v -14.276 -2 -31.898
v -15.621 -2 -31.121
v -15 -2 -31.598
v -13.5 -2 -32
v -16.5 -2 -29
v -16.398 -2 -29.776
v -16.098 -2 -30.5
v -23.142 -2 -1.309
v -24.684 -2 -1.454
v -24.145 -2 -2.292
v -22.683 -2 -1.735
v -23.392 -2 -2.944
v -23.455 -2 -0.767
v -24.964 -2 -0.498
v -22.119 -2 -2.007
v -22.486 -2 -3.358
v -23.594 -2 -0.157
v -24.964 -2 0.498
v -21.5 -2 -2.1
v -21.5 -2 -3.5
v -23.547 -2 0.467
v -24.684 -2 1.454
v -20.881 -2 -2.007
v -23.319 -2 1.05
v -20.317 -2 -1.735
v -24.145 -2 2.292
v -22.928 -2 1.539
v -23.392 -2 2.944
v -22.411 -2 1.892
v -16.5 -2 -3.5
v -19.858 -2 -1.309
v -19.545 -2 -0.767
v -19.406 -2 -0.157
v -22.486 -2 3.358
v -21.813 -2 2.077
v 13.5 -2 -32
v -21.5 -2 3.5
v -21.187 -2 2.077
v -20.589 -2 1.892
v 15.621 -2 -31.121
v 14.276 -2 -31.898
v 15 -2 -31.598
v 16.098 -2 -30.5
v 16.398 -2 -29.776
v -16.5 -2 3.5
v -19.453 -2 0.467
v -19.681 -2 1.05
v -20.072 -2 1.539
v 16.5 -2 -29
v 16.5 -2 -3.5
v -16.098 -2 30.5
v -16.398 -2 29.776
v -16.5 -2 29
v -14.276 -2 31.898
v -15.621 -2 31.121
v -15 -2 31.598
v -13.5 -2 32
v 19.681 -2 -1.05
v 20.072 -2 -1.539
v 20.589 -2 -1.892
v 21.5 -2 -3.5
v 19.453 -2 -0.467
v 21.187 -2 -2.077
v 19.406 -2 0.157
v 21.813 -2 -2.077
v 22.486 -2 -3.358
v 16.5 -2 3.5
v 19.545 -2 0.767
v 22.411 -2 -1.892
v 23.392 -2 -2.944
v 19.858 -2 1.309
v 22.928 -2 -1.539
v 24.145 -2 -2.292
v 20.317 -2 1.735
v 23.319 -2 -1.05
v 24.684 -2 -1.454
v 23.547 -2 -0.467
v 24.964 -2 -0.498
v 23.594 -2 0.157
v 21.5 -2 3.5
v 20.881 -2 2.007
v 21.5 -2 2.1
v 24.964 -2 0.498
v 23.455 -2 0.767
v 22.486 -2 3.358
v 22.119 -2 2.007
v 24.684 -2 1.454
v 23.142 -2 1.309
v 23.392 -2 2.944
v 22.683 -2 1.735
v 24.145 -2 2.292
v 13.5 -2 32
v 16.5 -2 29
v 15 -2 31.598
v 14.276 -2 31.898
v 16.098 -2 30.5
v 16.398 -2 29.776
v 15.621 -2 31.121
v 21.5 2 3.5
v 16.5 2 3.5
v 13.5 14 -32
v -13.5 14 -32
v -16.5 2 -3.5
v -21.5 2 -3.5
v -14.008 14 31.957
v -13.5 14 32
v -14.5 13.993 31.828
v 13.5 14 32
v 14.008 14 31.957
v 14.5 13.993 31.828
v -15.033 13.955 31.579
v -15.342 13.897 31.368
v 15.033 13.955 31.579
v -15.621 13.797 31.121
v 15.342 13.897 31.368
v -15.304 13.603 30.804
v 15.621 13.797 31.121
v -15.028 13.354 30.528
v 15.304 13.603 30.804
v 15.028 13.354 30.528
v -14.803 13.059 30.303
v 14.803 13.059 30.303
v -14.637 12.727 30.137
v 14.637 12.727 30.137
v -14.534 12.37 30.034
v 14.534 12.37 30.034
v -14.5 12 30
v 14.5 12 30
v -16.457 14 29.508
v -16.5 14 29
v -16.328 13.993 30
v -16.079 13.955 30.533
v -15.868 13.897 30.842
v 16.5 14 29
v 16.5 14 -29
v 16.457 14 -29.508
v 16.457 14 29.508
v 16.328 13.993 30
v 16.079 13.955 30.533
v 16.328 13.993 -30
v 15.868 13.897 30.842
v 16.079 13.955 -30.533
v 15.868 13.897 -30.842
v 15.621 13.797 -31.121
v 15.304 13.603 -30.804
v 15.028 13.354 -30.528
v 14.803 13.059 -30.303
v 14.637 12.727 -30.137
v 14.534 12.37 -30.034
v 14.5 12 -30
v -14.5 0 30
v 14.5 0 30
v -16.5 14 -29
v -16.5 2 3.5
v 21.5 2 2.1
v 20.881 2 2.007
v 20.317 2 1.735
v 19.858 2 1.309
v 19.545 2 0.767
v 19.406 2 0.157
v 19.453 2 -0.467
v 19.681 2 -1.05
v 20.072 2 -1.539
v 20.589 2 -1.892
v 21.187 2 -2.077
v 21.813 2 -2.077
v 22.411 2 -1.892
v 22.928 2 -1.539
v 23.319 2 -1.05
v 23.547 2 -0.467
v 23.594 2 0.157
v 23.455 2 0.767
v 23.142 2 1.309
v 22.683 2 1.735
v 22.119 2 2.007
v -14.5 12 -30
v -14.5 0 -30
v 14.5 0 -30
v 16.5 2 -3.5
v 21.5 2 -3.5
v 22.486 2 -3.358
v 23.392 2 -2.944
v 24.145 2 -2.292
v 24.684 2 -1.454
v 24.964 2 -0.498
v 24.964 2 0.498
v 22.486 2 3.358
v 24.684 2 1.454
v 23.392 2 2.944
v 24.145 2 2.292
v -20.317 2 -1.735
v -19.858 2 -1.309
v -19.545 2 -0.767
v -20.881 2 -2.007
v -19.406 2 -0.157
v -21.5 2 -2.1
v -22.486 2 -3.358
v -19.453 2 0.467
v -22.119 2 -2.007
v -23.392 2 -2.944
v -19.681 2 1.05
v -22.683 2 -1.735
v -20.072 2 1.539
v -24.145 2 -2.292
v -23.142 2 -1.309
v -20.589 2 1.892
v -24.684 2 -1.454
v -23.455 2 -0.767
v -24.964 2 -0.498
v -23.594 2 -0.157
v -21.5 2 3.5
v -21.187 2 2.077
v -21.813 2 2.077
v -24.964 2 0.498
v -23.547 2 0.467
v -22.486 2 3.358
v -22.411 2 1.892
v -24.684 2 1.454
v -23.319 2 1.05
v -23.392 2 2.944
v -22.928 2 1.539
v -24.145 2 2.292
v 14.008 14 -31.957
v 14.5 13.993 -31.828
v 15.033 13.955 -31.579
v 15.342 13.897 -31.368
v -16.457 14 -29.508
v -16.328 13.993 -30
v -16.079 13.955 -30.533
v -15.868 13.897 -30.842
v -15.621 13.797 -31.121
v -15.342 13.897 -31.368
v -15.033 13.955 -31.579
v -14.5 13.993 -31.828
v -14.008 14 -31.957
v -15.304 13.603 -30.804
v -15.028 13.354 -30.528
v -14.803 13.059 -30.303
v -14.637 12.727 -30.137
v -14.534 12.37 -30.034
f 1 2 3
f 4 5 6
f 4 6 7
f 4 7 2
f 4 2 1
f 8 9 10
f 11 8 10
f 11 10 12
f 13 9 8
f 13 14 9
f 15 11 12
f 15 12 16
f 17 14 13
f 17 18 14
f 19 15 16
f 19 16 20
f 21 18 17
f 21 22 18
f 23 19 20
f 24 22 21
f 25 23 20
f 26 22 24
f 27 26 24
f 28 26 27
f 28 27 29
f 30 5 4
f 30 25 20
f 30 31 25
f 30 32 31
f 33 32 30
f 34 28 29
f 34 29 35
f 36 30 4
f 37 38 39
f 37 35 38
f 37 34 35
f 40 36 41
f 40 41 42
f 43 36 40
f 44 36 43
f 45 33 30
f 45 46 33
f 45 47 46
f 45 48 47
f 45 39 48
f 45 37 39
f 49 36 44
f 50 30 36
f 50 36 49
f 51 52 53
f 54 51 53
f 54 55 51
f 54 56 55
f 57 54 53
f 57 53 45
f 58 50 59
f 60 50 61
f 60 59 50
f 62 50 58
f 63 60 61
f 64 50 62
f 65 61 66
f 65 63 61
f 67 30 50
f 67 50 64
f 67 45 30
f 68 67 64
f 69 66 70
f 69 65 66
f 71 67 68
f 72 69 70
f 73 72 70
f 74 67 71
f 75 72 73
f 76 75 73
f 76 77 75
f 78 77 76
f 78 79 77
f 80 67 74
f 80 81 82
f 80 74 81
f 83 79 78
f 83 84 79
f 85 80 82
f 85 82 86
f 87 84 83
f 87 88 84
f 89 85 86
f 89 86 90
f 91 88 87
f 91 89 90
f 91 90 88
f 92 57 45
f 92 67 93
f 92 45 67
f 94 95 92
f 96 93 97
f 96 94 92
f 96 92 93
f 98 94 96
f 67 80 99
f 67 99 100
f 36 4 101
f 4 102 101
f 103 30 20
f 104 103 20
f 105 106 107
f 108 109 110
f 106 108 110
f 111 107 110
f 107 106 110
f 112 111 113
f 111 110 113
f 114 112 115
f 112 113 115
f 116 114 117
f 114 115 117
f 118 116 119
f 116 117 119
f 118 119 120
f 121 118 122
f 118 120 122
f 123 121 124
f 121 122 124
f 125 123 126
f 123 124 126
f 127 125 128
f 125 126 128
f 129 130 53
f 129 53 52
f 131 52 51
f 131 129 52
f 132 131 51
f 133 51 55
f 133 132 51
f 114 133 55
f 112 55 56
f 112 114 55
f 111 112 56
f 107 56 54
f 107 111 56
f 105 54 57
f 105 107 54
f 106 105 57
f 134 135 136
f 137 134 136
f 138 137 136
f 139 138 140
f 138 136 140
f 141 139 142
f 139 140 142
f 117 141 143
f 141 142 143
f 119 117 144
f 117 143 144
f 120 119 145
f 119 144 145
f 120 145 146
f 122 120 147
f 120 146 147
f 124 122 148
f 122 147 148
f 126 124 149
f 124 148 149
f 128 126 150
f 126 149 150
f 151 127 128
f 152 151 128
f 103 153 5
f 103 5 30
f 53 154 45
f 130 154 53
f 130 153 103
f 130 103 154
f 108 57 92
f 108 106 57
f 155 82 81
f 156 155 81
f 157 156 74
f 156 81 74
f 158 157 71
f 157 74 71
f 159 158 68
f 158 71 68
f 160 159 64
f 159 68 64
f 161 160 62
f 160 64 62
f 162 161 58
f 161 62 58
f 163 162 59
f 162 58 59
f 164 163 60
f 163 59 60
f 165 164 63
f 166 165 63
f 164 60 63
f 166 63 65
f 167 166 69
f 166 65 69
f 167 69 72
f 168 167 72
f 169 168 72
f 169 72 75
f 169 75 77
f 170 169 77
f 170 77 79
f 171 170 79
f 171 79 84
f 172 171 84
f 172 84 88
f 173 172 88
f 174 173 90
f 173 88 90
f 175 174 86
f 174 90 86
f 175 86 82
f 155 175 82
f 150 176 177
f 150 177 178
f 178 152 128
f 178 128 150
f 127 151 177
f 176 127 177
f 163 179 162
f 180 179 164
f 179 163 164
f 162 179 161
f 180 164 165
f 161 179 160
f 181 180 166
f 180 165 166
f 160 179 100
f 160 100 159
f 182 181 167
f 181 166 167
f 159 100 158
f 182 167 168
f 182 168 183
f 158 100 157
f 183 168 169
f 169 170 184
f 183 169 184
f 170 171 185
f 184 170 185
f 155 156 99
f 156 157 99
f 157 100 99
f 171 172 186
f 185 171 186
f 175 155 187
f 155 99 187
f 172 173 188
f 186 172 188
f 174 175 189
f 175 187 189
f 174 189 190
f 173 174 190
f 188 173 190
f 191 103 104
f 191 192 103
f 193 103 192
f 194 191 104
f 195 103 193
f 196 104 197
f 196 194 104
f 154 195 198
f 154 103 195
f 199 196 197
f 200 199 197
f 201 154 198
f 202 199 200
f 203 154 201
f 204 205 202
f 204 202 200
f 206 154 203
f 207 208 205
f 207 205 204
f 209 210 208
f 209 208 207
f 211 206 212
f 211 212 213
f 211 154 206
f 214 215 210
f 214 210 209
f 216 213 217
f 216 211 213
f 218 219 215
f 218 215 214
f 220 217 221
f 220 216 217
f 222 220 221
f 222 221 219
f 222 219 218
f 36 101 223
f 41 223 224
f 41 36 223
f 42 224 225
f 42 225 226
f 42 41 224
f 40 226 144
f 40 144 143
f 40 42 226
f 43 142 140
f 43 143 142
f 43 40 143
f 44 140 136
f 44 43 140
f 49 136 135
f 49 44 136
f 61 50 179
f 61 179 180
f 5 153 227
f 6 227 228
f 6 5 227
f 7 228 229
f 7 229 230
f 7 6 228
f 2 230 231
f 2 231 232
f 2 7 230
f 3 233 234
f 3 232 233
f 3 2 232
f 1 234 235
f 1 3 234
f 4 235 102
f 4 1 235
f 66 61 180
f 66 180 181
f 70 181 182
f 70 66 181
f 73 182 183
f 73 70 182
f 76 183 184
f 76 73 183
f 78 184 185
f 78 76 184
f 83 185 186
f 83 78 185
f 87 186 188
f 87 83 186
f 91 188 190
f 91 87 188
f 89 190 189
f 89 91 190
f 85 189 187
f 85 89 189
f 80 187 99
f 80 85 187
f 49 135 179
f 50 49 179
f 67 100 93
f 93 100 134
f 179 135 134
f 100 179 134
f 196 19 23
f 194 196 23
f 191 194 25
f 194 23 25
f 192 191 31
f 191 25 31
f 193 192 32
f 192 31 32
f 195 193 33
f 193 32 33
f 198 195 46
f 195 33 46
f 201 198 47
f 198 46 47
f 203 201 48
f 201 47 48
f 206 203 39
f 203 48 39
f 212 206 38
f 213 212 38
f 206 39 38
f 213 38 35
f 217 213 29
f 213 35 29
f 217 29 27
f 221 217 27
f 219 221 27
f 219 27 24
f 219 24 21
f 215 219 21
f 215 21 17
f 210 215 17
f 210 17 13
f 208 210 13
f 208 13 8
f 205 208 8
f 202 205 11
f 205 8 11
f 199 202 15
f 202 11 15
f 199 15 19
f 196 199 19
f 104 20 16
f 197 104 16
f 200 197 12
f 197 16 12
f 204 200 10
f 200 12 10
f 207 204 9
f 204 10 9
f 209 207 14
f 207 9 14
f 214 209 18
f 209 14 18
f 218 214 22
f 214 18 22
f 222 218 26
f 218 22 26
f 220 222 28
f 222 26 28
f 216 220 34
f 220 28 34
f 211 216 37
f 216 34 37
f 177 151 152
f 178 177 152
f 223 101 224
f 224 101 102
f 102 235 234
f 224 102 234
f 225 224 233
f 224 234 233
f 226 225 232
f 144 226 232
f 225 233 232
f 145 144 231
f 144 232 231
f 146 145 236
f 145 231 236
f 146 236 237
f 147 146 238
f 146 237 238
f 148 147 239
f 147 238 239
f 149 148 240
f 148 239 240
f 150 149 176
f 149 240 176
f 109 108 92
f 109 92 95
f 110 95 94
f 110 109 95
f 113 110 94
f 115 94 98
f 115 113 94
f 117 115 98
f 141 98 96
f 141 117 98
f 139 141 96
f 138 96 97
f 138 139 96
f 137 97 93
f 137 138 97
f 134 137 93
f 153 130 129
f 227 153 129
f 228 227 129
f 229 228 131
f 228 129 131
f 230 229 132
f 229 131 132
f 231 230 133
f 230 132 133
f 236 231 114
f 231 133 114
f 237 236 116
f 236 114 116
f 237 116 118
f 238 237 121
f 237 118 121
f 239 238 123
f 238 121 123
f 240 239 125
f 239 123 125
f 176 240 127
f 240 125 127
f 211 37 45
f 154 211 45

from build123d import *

# Parameters (mm, degrees)
SKETCH2_W           = 33
SKETCH2_H           = 64
SKETCH2_W_2         = 29
SKETCH2_H_2         = 60
BOSS_EXTRUDE1_DEPTH = 14
SKETCH3_W           = 33
SKETCH3_H           = 64
BOSS_EXTRUDE2_DEPTH = 2
SKETCH4_R           = 2.1
BOSS_EXTRUDE3_DEPTH = 4
FILLET1_R           = 3
FILLET2_R           = 2


with BuildPart() as part:
    # Sketch2 → Boss-Extrude1 (new body)
    with BuildSketch(Plane(origin=(0, 0, 0), x_dir=(1, 0, 0), z_dir=(0, 1, 0))):
        Rectangle(SKETCH2_W, SKETCH2_H)
        Rectangle(SKETCH2_W_2, SKETCH2_H_2, mode=Mode.SUBTRACT)
    extrude(amount=BOSS_EXTRUDE1_DEPTH)

    # Sketch3 → Boss-Extrude2 (add)
    with BuildSketch(Plane.XZ):
        Rectangle(SKETCH3_W, SKETCH3_H)
    extrude(amount=BOSS_EXTRUDE2_DEPTH)

    # Sketch4 → Boss-Extrude3 (add)
    # profile 1 of 2: a face of its own
    with BuildSketch(Plane.XZ.offset(2)):
        with BuildLine():
            Line((-21.5, 3.5), (-16.5, 3.5))
            Line((-16.5, 3.5), (-16.5, -3.5))
            Line((-16.5, -3.5), (-21.5, -3.5))
            ThreePointArc((-21.5, -3.5), (-25, 0), (-21.5, 3.5))
        make_face()
        with Locations(Location((-21.5, 0, 0), (0, 0, 270))):
            Circle(SKETCH4_R, mode=Mode.SUBTRACT)
    # profile 2 of 2: a face of its own
    with BuildSketch(Plane.XZ.offset(2)):
        with BuildLine():
            Line((16.5, 3.5), (16.5, -3.5))
            Line((16.5, -3.5), (21.5, -3.5))
            ThreePointArc((21.5, -3.5), (25, 0), (21.5, 3.5))
            Line((21.5, 3.5), (16.5, 3.5))
        make_face()
        with Locations(Location((21.5, 0, 0), (0, 0, 90))):
            Circle(SKETCH4_R, mode=Mode.SUBTRACT)
    extrude(amount=-BOSS_EXTRUDE3_DEPTH)

    # Fillet1
    fillet1_edges = [part.edges().sort_by_distance(p)[0] for p in [
        (16.5, 6, 32),
        (-16.5, 6, 32),
        (-16.5, 6, -32),
        (16.5, 6, -32),
    ]]
    fillet(fillet1_edges, radius=FILLET1_R)

    # Fillet2
    # the kernel refuses this fillet: 2 mm, written as the material it takes off along each edge
    with BuildSketch(Plane(origin=(14.5, 14, -30), x_dir=(1, 0, 0), z_dir=(0, 0, 1)), Plane(origin=(-14.5, 14, 30), x_dir=(-1, 0, 0), z_dir=(0, 0, -1))) as fillet2_piece_1:
        with BuildLine():
            CenterArc((FILLET2_R, -FILLET2_R), FILLET2_R, 90, 90)
            Line((0, -FILLET2_R), (-FILLET2_R * 0.02, -FILLET2_R))
            Line((-FILLET2_R * 0.02, -FILLET2_R), (-FILLET2_R * 0.02, FILLET2_R * 0.02))
            Line((-FILLET2_R * 0.02, FILLET2_R * 0.02), (FILLET2_R, FILLET2_R * 0.02))
            Line((FILLET2_R, FILLET2_R * 0.02), (FILLET2_R, 0))
        make_face()
    extrude(amount=60, mode=Mode.SUBTRACT)
    with BuildSketch(Plane(origin=(-14.5, 14, -30), x_dir=(0, 0, -1), z_dir=(1, 0, 0)), Plane(origin=(14.5, 14, 30), x_dir=(0, 0, 1), z_dir=(-1, 0, 0))) as fillet2_piece_2:
        with BuildLine():
            CenterArc((FILLET2_R, -FILLET2_R), FILLET2_R, 90, 90)
            Line((0, -FILLET2_R), (-FILLET2_R * 0.02, -FILLET2_R))
            Line((-FILLET2_R * 0.02, -FILLET2_R), (-FILLET2_R * 0.02, FILLET2_R * 0.02))
            Line((-FILLET2_R * 0.02, FILLET2_R * 0.02), (FILLET2_R, FILLET2_R * 0.02))
            Line((FILLET2_R, FILLET2_R * 0.02), (FILLET2_R, 0))
        make_face()
    extrude(amount=29, mode=Mode.SUBTRACT)
    with BuildSketch(Plane(origin=(14.5, 14, -35), x_dir=(1, 0, 0), z_dir=(0, 0, 1))) as fillet2_piece_3a_section:
        with BuildLine():
            CenterArc((FILLET2_R, -FILLET2_R), FILLET2_R, 90, 90)
            Line((0, -FILLET2_R), (-FILLET2_R * 0.02, -FILLET2_R))
            Line((-FILLET2_R * 0.02, -FILLET2_R), (-FILLET2_R * 0.02, FILLET2_R * 0.02))
            Line((-FILLET2_R * 0.02, FILLET2_R * 0.02), (FILLET2_R, FILLET2_R * 0.02))
            Line((FILLET2_R, FILLET2_R * 0.02), (FILLET2_R, 0))
        make_face()
    fillet2_piece_3a = extrude(amount=65, mode=Mode.PRIVATE)
    fillet2_piece_3a = split(fillet2_piece_3a, bisect_by=Plane(origin=(14.952790229, 13.547209771, -30), z_dir=(0, 0, -1)), keep=Keep.TOP, mode=Mode.PRIVATE)
    with BuildSketch(Plane(origin=(-14.5, 14, -30), x_dir=(0, 0, -1), z_dir=(1, 0, 0))) as fillet2_piece_3b_section:
        with BuildLine():
            CenterArc((FILLET2_R, -FILLET2_R), FILLET2_R, 90, 90)
            Line((0, -FILLET2_R), (-FILLET2_R * 0.02, -FILLET2_R))
            Line((-FILLET2_R * 0.02, -FILLET2_R), (-FILLET2_R * 0.02, FILLET2_R * 0.02))
            Line((-FILLET2_R * 0.02, FILLET2_R * 0.02), (FILLET2_R, FILLET2_R * 0.02))
            Line((FILLET2_R, FILLET2_R * 0.02), (FILLET2_R, 0))
        make_face()
    fillet2_piece_3b = extrude(amount=34, mode=Mode.PRIVATE)
    fillet2_piece_3b = split(fillet2_piece_3b, bisect_by=Plane(origin=(14.5, 13.547209771, -30.452790229), z_dir=(1, 0, 0)), keep=Keep.TOP, mode=Mode.PRIVATE)
    fillet2_piece_3 = fillet2_piece_3a & fillet2_piece_3b
    add(fillet2_piece_3, mode=Mode.SUBTRACT)
    with BuildSketch(Plane(origin=(19.5, 14, 30), x_dir=(0, 0, 1), z_dir=(-1, 0, 0))) as fillet2_piece_4a_section:
        with BuildLine():
            CenterArc((FILLET2_R, -FILLET2_R), FILLET2_R, 90, 90)
            Line((0, -FILLET2_R), (-FILLET2_R * 0.02, -FILLET2_R))
            Line((-FILLET2_R * 0.02, -FILLET2_R), (-FILLET2_R * 0.02, FILLET2_R * 0.02))
            Line((-FILLET2_R * 0.02, FILLET2_R * 0.02), (FILLET2_R, FILLET2_R * 0.02))
            Line((FILLET2_R, FILLET2_R * 0.02), (FILLET2_R, 0))
        make_face()
    fillet2_piece_4a = extrude(amount=34, mode=Mode.PRIVATE)
    fillet2_piece_4a = split(fillet2_piece_4a, bisect_by=Plane(origin=(14.5, 13.547209771, 30.452790229), z_dir=(1, 0, 0)), keep=Keep.TOP, mode=Mode.PRIVATE)
    with BuildSketch(Plane(origin=(14.5, 14, -30), x_dir=(1, 0, 0), z_dir=(0, 0, 1))) as fillet2_piece_4b_section:
        with BuildLine():
            CenterArc((FILLET2_R, -FILLET2_R), FILLET2_R, 90, 90)
            Line((0, -FILLET2_R), (-FILLET2_R * 0.02, -FILLET2_R))
            Line((-FILLET2_R * 0.02, -FILLET2_R), (-FILLET2_R * 0.02, FILLET2_R * 0.02))
            Line((-FILLET2_R * 0.02, FILLET2_R * 0.02), (FILLET2_R, FILLET2_R * 0.02))
            Line((FILLET2_R, FILLET2_R * 0.02), (FILLET2_R, 0))
        make_face()
    fillet2_piece_4b = extrude(amount=65, mode=Mode.PRIVATE)
    fillet2_piece_4b = split(fillet2_piece_4b, bisect_by=Plane(origin=(14.952790229, 13.547209771, 30), z_dir=(0, 0, 1)), keep=Keep.TOP, mode=Mode.PRIVATE)
    fillet2_piece_4 = fillet2_piece_4a & fillet2_piece_4b
    add(fillet2_piece_4, mode=Mode.SUBTRACT)
    with BuildSketch(Plane(origin=(-14.5, 14, 30), x_dir=(-1, 0, 0), z_dir=(0, 0, -1))) as fillet2_piece_5a_section:
        with BuildLine():
            CenterArc((FILLET2_R, -FILLET2_R), FILLET2_R, 90, 90)
            Line((0, -FILLET2_R), (-FILLET2_R * 0.02, -FILLET2_R))
            Line((-FILLET2_R * 0.02, -FILLET2_R), (-FILLET2_R * 0.02, FILLET2_R * 0.02))
            Line((-FILLET2_R * 0.02, FILLET2_R * 0.02), (FILLET2_R, FILLET2_R * 0.02))
            Line((FILLET2_R, FILLET2_R * 0.02), (FILLET2_R, 0))
        make_face()
    fillet2_piece_5a = extrude(amount=65, mode=Mode.PRIVATE)
    fillet2_piece_5a = split(fillet2_piece_5a, bisect_by=Plane(origin=(-14.952790229, 13.547209771, -30), z_dir=(0, 0, -1)), keep=Keep.TOP, mode=Mode.PRIVATE)
    with BuildSketch(Plane(origin=(-19.5, 14, -30), x_dir=(0, 0, -1), z_dir=(1, 0, 0))) as fillet2_piece_5b_section:
        with BuildLine():
            CenterArc((FILLET2_R, -FILLET2_R), FILLET2_R, 90, 90)
            Line((0, -FILLET2_R), (-FILLET2_R * 0.02, -FILLET2_R))
            Line((-FILLET2_R * 0.02, -FILLET2_R), (-FILLET2_R * 0.02, FILLET2_R * 0.02))
            Line((-FILLET2_R * 0.02, FILLET2_R * 0.02), (FILLET2_R, FILLET2_R * 0.02))
            Line((FILLET2_R, FILLET2_R * 0.02), (FILLET2_R, 0))
        make_face()
    fillet2_piece_5b = extrude(amount=34, mode=Mode.PRIVATE)
    fillet2_piece_5b = split(fillet2_piece_5b, bisect_by=Plane(origin=(-14.5, 13.547209771, -30.452790229), z_dir=(-1, 0, 0)), keep=Keep.TOP, mode=Mode.PRIVATE)
    fillet2_piece_5 = fillet2_piece_5a & fillet2_piece_5b
    add(fillet2_piece_5, mode=Mode.SUBTRACT)
    with BuildSketch(Plane(origin=(-14.5, 14, 35), x_dir=(-1, 0, 0), z_dir=(0, 0, -1))) as fillet2_piece_6a_section:
        with BuildLine():
            CenterArc((FILLET2_R, -FILLET2_R), FILLET2_R, 90, 90)
            Line((0, -FILLET2_R), (-FILLET2_R * 0.02, -FILLET2_R))
            Line((-FILLET2_R * 0.02, -FILLET2_R), (-FILLET2_R * 0.02, FILLET2_R * 0.02))
            Line((-FILLET2_R * 0.02, FILLET2_R * 0.02), (FILLET2_R, FILLET2_R * 0.02))
            Line((FILLET2_R, FILLET2_R * 0.02), (FILLET2_R, 0))
        make_face()
    fillet2_piece_6a = extrude(amount=65, mode=Mode.PRIVATE)
    fillet2_piece_6a = split(fillet2_piece_6a, bisect_by=Plane(origin=(-14.952790229, 13.547209771, 30), z_dir=(0, 0, 1)), keep=Keep.TOP, mode=Mode.PRIVATE)
    with BuildSketch(Plane(origin=(14.5, 14, 30), x_dir=(0, 0, 1), z_dir=(-1, 0, 0))) as fillet2_piece_6b_section:
        with BuildLine():
            CenterArc((FILLET2_R, -FILLET2_R), FILLET2_R, 90, 90)
            Line((0, -FILLET2_R), (-FILLET2_R * 0.02, -FILLET2_R))
            Line((-FILLET2_R * 0.02, -FILLET2_R), (-FILLET2_R * 0.02, FILLET2_R * 0.02))
            Line((-FILLET2_R * 0.02, FILLET2_R * 0.02), (FILLET2_R, FILLET2_R * 0.02))
            Line((FILLET2_R, FILLET2_R * 0.02), (FILLET2_R, 0))
        make_face()
    fillet2_piece_6b = extrude(amount=34, mode=Mode.PRIVATE)
    fillet2_piece_6b = split(fillet2_piece_6b, bisect_by=Plane(origin=(-14.5, 13.547209771, 30.452790229), z_dir=(-1, 0, 0)), keep=Keep.TOP, mode=Mode.PRIVATE)
    fillet2_piece_6 = fillet2_piece_6a & fillet2_piece_6b
    add(fillet2_piece_6, mode=Mode.SUBTRACT)


solid = part.part
